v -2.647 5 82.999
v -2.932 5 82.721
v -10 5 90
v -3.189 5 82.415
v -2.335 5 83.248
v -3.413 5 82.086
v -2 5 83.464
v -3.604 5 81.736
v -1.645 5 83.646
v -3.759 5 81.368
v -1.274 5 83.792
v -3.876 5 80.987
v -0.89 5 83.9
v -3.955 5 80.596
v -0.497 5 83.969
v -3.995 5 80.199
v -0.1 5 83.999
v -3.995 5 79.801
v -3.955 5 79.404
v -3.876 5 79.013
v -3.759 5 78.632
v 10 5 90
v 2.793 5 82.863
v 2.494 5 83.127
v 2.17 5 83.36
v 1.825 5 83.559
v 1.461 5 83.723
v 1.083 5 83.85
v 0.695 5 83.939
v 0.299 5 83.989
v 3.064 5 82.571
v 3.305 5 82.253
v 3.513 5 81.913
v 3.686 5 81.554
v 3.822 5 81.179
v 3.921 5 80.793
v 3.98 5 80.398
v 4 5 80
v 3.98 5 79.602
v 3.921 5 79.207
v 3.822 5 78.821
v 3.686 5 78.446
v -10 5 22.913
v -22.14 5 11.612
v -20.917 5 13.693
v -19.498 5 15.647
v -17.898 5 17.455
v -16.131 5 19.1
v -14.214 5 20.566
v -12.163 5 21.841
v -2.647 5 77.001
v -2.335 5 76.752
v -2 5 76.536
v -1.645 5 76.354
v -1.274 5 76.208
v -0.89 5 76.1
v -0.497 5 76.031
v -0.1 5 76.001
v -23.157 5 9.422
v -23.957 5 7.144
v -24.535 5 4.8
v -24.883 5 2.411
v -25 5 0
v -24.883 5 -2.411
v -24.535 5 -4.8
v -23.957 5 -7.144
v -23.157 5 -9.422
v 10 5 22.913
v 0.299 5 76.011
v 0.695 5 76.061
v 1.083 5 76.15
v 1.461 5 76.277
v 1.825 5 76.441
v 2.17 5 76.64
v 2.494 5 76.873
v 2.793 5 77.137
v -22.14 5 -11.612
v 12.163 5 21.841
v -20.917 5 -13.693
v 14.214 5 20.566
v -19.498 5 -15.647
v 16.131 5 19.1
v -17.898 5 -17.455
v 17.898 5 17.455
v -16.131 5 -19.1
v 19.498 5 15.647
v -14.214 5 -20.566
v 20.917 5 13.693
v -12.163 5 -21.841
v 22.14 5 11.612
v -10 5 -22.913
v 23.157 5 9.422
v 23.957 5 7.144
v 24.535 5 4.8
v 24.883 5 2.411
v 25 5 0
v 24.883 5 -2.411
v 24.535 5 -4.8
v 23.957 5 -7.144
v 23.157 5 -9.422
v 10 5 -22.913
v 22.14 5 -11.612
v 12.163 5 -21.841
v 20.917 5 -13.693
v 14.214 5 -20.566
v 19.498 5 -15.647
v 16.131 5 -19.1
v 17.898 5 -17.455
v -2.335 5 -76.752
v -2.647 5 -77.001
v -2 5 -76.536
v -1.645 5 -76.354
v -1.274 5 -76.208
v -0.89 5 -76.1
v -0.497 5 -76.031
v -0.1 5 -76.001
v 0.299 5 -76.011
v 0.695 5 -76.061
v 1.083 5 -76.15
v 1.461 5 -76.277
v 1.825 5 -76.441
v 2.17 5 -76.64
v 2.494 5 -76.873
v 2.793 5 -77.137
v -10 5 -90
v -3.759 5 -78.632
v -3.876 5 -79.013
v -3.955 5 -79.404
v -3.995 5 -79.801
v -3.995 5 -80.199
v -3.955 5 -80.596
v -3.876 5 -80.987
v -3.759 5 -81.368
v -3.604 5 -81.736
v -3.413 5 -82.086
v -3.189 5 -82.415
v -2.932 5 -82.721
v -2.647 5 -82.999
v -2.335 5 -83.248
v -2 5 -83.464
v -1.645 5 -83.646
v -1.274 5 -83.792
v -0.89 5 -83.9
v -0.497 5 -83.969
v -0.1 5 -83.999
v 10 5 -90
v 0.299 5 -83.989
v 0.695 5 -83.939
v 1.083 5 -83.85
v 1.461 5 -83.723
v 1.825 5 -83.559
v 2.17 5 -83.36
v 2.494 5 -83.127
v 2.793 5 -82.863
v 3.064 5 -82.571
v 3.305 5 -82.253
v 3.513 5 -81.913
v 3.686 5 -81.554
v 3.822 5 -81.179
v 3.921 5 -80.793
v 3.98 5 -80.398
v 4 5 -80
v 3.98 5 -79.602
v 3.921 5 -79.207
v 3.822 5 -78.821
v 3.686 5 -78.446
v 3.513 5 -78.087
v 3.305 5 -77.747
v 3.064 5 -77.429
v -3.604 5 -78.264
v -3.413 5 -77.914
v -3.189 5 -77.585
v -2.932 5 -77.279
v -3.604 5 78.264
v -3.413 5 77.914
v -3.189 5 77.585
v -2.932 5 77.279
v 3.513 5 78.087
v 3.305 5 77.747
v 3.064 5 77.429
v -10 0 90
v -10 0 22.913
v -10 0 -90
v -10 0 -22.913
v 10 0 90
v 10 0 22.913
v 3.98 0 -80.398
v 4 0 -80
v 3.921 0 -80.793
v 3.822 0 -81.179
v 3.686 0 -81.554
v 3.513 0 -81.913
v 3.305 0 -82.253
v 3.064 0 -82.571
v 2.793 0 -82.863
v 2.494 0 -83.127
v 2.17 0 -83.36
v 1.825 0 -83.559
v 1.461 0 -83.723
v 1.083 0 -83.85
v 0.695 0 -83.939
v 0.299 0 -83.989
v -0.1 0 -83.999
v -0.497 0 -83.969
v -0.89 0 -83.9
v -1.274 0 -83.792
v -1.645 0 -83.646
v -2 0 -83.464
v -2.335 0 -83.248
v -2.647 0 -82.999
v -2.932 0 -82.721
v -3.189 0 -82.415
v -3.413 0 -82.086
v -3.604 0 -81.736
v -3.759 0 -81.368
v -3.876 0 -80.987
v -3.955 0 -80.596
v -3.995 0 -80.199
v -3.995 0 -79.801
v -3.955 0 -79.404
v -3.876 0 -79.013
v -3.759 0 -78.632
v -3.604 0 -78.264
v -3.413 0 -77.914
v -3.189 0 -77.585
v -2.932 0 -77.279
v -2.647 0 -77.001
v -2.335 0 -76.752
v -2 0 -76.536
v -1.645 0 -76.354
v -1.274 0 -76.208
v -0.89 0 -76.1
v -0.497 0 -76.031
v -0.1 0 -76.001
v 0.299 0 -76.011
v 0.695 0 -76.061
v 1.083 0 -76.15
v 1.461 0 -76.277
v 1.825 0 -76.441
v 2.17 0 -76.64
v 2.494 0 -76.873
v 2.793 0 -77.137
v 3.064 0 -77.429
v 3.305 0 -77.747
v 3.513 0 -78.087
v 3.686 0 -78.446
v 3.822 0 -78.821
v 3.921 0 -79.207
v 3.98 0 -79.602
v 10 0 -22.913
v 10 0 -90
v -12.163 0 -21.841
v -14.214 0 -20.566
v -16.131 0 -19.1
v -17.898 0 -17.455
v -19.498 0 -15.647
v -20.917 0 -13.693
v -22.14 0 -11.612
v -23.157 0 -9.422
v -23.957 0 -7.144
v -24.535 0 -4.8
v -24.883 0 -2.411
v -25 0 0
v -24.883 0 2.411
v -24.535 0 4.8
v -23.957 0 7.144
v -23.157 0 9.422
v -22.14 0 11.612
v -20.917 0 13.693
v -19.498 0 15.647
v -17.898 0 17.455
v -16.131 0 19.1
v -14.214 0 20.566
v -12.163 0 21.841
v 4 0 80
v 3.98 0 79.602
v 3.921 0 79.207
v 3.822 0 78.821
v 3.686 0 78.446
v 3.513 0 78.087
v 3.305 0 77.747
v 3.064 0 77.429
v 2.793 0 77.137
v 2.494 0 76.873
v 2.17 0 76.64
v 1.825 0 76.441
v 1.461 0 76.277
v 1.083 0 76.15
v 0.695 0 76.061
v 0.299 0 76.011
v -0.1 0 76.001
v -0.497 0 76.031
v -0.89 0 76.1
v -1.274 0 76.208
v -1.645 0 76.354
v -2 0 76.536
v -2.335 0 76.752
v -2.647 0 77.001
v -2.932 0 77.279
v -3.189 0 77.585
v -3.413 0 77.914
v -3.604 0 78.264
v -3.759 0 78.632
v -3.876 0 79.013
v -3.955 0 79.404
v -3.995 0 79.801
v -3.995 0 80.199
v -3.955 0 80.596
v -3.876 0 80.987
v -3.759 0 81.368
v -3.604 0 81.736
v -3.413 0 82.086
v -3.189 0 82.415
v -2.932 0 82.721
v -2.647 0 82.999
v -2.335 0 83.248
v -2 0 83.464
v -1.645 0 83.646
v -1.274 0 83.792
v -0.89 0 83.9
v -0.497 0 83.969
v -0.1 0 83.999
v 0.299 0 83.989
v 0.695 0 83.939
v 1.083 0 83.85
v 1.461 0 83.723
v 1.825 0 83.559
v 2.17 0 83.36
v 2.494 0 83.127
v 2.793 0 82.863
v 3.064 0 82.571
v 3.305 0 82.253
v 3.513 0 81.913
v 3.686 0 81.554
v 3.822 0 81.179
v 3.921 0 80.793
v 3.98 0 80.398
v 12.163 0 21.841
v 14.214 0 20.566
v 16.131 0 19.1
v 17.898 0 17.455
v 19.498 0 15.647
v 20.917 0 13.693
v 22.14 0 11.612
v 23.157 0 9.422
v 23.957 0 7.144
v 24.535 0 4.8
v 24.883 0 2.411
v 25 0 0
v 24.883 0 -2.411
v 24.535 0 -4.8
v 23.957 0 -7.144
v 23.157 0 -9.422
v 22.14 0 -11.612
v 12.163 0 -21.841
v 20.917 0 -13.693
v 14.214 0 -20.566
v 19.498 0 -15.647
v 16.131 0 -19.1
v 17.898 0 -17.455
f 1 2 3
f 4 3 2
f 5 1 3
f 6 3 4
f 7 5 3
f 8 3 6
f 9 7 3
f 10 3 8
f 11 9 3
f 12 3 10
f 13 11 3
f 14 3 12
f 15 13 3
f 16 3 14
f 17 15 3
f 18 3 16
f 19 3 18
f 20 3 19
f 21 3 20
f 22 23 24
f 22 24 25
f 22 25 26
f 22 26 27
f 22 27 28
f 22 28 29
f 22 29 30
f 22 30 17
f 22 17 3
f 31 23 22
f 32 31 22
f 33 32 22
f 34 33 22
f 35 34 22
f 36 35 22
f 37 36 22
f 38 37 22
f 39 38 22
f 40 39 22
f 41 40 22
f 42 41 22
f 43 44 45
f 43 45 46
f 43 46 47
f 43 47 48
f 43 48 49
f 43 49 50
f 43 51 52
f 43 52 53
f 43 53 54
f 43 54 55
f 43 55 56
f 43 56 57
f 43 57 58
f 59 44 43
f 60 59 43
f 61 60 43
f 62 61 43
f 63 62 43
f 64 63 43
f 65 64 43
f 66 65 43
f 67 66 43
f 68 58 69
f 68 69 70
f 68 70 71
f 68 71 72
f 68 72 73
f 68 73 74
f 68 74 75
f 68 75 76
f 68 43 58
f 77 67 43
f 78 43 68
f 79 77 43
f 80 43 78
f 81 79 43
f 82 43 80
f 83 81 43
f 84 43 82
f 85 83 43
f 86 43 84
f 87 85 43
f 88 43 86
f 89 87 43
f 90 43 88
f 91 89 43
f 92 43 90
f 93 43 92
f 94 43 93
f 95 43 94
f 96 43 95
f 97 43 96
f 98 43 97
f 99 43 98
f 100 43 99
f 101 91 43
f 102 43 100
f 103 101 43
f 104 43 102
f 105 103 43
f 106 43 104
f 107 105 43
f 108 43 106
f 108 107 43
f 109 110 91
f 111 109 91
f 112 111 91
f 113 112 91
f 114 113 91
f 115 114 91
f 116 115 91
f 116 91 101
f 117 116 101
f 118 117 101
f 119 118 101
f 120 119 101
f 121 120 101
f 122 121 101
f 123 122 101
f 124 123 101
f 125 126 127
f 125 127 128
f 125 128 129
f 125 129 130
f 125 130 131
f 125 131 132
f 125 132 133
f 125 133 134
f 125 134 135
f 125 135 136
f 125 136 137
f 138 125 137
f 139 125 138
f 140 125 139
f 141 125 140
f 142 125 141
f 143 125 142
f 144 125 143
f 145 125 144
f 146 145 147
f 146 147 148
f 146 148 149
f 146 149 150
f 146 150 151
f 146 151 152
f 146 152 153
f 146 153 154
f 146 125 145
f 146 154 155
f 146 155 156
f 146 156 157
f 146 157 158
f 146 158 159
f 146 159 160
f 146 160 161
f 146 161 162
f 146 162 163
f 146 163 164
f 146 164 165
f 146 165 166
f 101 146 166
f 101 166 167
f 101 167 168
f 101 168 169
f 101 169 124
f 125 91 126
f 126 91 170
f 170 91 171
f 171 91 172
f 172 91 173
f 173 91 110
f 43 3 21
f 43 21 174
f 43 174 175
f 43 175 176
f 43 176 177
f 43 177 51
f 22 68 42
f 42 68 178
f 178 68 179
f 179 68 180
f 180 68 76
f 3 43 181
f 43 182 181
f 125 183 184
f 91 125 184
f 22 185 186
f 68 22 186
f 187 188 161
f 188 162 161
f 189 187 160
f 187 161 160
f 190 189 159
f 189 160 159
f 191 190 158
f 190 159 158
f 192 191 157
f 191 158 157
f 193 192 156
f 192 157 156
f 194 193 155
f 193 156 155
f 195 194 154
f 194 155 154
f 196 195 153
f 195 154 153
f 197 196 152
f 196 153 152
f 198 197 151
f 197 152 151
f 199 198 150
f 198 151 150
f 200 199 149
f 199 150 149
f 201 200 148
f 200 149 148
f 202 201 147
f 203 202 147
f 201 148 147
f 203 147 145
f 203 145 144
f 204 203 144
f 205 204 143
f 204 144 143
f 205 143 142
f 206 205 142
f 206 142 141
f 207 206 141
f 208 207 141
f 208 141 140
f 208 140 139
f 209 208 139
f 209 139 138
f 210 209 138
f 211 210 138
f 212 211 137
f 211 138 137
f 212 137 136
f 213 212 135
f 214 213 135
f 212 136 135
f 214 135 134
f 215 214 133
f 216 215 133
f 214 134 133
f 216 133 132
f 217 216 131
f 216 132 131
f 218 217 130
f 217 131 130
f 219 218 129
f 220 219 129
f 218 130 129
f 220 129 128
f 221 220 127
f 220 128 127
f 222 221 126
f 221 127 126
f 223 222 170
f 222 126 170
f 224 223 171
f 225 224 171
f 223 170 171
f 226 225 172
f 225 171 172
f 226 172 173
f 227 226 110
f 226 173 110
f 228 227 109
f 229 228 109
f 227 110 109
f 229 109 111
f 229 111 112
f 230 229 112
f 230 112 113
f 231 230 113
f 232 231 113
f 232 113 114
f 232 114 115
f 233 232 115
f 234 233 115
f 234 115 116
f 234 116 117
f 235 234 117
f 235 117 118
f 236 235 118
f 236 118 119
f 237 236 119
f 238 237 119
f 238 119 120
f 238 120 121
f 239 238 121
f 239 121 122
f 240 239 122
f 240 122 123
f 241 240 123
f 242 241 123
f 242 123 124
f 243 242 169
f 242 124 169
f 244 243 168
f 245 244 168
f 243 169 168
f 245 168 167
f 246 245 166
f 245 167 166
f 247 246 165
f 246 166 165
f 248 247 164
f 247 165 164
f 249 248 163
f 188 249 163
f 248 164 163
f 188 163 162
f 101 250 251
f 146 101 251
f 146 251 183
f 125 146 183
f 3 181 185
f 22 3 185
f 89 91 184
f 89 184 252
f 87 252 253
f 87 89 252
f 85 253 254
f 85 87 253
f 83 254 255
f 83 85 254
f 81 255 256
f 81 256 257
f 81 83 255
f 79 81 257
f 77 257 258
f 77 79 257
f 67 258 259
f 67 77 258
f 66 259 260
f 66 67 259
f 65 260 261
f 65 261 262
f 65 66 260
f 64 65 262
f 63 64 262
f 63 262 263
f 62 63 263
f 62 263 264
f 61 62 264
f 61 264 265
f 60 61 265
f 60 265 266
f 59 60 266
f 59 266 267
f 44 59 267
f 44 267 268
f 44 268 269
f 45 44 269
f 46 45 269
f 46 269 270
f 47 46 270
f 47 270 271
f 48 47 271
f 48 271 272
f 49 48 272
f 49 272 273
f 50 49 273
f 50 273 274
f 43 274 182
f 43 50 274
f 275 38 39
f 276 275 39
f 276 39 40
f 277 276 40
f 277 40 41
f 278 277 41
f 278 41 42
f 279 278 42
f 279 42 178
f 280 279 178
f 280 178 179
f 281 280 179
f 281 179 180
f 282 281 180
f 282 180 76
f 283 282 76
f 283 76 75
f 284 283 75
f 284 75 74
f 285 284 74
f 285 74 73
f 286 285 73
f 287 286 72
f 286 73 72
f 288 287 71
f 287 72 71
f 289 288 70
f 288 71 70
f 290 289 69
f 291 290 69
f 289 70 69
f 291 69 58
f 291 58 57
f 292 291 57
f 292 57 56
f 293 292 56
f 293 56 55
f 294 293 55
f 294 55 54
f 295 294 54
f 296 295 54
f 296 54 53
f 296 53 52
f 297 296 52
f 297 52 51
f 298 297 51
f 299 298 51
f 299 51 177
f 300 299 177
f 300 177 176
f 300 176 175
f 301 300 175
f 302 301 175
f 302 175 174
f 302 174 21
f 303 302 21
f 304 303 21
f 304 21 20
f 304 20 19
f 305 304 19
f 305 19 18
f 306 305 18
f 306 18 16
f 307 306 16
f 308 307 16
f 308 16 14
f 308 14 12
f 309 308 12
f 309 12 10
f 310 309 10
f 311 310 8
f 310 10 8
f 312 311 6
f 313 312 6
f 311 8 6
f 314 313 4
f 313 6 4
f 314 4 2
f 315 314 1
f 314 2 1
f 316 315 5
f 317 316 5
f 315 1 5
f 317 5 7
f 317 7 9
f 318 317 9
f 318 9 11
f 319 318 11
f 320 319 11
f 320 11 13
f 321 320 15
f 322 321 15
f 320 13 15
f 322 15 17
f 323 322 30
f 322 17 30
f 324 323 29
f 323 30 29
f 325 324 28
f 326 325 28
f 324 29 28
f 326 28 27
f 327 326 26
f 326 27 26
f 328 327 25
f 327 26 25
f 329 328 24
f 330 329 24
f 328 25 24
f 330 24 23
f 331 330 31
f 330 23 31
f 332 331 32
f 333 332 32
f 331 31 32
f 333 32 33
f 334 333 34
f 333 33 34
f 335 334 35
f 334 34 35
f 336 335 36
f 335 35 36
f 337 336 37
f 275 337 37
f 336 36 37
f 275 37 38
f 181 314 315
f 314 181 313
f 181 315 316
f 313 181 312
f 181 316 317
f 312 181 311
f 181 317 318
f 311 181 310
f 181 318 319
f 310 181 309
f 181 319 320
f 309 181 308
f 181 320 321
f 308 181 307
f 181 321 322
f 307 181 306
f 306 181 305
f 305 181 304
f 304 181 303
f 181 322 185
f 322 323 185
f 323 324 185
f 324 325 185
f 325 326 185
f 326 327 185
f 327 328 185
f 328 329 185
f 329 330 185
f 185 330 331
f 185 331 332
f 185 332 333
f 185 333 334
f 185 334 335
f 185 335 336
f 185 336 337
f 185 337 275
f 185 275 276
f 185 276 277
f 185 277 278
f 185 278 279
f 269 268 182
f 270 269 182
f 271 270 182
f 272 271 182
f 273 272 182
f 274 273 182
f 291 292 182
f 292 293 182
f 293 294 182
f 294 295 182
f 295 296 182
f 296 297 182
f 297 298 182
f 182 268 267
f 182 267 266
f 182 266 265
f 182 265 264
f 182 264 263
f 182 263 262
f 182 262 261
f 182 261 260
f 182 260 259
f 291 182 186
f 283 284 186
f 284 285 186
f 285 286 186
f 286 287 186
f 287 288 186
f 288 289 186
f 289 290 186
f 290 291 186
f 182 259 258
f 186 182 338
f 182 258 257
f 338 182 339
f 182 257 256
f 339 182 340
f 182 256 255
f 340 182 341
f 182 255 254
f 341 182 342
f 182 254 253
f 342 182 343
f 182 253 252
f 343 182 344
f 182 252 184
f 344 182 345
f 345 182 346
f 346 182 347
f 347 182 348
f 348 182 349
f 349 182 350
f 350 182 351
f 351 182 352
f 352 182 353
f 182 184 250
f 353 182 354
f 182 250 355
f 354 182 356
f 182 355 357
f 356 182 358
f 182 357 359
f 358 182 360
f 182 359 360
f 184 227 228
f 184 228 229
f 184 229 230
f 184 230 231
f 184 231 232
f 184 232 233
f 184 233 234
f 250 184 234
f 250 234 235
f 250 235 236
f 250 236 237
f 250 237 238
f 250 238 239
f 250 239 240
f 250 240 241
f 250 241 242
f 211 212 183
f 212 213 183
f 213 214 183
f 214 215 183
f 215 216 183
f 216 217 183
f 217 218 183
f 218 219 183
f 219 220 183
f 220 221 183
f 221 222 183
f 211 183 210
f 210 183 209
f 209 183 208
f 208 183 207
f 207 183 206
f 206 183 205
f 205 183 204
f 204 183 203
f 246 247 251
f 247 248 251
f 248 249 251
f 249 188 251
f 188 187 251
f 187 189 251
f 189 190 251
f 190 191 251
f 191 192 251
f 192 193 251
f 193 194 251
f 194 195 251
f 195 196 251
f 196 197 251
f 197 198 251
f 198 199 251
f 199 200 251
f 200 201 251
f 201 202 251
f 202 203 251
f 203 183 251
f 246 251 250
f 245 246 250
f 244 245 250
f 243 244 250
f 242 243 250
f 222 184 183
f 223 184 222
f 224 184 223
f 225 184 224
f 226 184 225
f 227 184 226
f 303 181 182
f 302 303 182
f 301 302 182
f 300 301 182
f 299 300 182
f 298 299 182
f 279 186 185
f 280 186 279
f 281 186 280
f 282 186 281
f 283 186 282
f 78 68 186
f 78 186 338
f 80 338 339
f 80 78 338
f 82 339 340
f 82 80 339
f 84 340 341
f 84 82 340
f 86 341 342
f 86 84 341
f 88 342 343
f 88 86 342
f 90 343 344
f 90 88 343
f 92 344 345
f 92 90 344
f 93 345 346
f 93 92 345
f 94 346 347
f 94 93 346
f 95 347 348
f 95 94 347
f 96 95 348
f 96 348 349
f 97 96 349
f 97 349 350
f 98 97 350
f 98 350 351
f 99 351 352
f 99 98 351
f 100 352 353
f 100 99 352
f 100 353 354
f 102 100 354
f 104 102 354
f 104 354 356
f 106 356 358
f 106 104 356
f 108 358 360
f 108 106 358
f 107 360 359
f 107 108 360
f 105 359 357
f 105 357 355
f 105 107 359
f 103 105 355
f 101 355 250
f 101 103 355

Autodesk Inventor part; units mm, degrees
ref_plane "YZ Plane" through (0, 0, 0) normal (1, 0, 0) x (0, 1, 0)
ref_plane "XZ Plane" through (0, 0, 0) normal (0, 1, 0) x (-1, 0, 0)
ref_plane "XY Plane" through (0, 0, 0) normal (0, 0, 1) x (1, 0, 0)
sketch "Boceto1" plane through (0, 0, 0) normal (0, 1, 0) x (-1, 0, 0)
  line L0 (10, 90) -> (-10, 90)
  line L1 (-10, 90) -> (-10, -90)
  line L2 (-10, -90) -> (10, -90)
  line L3 (10, -90) -> (10, 90)
  line L4 (14, 0) -> (-14, 0) projected
  line L5 (0, -126) -> (0, 126) projected
  point P0 (0, 0)
  point P1 (10, 0)
  point P2 (0, 90)
  dimension "d0" = 20
  dimension "d1" = 180
extrude "Extrusión1" add sketch "Boceto1" along normal blind 5
sketch "Boceto2" plane through (0, 5, 0) normal (0, 1, 0) x (1, 0, 0)
  line L0 (10, 90) -> (-10, 90) projected
  line L1 (-10, 90) -> (-10, -90) projected
  line L2 (-10, -90) -> (10, -90) projected
  line L3 (10, -90) -> (10, 90) projected
  circle A0 centre (0, -80) radius 4
  circle A1 centre (0, 80) radius 4
  line L4 (0, 126) -> (0, -126) projected
  point P0 (0, 0)
  dimension "d4" = 8
  dimension "d5" = 8
  dimension "d6" = 10
  dimension "d7" = 10
extrude "Extrusión2" cut sketch "Boceto2" against normal blind 5 contours L4 A1 | A1 L4 | L4 A0 | A0 L4
sketch "Boceto3" plane through (0, 5, 0) normal (0, 1, 0) x (1, 0, 0)
  circle A0 centre (0, 0) radius 25
  dimension "d10" = 50
extrude "Extrusión3" add sketch "Boceto3" against normal blind 5
equation "\"d5\" = d4"
properties part number "PlacaRetencion"
